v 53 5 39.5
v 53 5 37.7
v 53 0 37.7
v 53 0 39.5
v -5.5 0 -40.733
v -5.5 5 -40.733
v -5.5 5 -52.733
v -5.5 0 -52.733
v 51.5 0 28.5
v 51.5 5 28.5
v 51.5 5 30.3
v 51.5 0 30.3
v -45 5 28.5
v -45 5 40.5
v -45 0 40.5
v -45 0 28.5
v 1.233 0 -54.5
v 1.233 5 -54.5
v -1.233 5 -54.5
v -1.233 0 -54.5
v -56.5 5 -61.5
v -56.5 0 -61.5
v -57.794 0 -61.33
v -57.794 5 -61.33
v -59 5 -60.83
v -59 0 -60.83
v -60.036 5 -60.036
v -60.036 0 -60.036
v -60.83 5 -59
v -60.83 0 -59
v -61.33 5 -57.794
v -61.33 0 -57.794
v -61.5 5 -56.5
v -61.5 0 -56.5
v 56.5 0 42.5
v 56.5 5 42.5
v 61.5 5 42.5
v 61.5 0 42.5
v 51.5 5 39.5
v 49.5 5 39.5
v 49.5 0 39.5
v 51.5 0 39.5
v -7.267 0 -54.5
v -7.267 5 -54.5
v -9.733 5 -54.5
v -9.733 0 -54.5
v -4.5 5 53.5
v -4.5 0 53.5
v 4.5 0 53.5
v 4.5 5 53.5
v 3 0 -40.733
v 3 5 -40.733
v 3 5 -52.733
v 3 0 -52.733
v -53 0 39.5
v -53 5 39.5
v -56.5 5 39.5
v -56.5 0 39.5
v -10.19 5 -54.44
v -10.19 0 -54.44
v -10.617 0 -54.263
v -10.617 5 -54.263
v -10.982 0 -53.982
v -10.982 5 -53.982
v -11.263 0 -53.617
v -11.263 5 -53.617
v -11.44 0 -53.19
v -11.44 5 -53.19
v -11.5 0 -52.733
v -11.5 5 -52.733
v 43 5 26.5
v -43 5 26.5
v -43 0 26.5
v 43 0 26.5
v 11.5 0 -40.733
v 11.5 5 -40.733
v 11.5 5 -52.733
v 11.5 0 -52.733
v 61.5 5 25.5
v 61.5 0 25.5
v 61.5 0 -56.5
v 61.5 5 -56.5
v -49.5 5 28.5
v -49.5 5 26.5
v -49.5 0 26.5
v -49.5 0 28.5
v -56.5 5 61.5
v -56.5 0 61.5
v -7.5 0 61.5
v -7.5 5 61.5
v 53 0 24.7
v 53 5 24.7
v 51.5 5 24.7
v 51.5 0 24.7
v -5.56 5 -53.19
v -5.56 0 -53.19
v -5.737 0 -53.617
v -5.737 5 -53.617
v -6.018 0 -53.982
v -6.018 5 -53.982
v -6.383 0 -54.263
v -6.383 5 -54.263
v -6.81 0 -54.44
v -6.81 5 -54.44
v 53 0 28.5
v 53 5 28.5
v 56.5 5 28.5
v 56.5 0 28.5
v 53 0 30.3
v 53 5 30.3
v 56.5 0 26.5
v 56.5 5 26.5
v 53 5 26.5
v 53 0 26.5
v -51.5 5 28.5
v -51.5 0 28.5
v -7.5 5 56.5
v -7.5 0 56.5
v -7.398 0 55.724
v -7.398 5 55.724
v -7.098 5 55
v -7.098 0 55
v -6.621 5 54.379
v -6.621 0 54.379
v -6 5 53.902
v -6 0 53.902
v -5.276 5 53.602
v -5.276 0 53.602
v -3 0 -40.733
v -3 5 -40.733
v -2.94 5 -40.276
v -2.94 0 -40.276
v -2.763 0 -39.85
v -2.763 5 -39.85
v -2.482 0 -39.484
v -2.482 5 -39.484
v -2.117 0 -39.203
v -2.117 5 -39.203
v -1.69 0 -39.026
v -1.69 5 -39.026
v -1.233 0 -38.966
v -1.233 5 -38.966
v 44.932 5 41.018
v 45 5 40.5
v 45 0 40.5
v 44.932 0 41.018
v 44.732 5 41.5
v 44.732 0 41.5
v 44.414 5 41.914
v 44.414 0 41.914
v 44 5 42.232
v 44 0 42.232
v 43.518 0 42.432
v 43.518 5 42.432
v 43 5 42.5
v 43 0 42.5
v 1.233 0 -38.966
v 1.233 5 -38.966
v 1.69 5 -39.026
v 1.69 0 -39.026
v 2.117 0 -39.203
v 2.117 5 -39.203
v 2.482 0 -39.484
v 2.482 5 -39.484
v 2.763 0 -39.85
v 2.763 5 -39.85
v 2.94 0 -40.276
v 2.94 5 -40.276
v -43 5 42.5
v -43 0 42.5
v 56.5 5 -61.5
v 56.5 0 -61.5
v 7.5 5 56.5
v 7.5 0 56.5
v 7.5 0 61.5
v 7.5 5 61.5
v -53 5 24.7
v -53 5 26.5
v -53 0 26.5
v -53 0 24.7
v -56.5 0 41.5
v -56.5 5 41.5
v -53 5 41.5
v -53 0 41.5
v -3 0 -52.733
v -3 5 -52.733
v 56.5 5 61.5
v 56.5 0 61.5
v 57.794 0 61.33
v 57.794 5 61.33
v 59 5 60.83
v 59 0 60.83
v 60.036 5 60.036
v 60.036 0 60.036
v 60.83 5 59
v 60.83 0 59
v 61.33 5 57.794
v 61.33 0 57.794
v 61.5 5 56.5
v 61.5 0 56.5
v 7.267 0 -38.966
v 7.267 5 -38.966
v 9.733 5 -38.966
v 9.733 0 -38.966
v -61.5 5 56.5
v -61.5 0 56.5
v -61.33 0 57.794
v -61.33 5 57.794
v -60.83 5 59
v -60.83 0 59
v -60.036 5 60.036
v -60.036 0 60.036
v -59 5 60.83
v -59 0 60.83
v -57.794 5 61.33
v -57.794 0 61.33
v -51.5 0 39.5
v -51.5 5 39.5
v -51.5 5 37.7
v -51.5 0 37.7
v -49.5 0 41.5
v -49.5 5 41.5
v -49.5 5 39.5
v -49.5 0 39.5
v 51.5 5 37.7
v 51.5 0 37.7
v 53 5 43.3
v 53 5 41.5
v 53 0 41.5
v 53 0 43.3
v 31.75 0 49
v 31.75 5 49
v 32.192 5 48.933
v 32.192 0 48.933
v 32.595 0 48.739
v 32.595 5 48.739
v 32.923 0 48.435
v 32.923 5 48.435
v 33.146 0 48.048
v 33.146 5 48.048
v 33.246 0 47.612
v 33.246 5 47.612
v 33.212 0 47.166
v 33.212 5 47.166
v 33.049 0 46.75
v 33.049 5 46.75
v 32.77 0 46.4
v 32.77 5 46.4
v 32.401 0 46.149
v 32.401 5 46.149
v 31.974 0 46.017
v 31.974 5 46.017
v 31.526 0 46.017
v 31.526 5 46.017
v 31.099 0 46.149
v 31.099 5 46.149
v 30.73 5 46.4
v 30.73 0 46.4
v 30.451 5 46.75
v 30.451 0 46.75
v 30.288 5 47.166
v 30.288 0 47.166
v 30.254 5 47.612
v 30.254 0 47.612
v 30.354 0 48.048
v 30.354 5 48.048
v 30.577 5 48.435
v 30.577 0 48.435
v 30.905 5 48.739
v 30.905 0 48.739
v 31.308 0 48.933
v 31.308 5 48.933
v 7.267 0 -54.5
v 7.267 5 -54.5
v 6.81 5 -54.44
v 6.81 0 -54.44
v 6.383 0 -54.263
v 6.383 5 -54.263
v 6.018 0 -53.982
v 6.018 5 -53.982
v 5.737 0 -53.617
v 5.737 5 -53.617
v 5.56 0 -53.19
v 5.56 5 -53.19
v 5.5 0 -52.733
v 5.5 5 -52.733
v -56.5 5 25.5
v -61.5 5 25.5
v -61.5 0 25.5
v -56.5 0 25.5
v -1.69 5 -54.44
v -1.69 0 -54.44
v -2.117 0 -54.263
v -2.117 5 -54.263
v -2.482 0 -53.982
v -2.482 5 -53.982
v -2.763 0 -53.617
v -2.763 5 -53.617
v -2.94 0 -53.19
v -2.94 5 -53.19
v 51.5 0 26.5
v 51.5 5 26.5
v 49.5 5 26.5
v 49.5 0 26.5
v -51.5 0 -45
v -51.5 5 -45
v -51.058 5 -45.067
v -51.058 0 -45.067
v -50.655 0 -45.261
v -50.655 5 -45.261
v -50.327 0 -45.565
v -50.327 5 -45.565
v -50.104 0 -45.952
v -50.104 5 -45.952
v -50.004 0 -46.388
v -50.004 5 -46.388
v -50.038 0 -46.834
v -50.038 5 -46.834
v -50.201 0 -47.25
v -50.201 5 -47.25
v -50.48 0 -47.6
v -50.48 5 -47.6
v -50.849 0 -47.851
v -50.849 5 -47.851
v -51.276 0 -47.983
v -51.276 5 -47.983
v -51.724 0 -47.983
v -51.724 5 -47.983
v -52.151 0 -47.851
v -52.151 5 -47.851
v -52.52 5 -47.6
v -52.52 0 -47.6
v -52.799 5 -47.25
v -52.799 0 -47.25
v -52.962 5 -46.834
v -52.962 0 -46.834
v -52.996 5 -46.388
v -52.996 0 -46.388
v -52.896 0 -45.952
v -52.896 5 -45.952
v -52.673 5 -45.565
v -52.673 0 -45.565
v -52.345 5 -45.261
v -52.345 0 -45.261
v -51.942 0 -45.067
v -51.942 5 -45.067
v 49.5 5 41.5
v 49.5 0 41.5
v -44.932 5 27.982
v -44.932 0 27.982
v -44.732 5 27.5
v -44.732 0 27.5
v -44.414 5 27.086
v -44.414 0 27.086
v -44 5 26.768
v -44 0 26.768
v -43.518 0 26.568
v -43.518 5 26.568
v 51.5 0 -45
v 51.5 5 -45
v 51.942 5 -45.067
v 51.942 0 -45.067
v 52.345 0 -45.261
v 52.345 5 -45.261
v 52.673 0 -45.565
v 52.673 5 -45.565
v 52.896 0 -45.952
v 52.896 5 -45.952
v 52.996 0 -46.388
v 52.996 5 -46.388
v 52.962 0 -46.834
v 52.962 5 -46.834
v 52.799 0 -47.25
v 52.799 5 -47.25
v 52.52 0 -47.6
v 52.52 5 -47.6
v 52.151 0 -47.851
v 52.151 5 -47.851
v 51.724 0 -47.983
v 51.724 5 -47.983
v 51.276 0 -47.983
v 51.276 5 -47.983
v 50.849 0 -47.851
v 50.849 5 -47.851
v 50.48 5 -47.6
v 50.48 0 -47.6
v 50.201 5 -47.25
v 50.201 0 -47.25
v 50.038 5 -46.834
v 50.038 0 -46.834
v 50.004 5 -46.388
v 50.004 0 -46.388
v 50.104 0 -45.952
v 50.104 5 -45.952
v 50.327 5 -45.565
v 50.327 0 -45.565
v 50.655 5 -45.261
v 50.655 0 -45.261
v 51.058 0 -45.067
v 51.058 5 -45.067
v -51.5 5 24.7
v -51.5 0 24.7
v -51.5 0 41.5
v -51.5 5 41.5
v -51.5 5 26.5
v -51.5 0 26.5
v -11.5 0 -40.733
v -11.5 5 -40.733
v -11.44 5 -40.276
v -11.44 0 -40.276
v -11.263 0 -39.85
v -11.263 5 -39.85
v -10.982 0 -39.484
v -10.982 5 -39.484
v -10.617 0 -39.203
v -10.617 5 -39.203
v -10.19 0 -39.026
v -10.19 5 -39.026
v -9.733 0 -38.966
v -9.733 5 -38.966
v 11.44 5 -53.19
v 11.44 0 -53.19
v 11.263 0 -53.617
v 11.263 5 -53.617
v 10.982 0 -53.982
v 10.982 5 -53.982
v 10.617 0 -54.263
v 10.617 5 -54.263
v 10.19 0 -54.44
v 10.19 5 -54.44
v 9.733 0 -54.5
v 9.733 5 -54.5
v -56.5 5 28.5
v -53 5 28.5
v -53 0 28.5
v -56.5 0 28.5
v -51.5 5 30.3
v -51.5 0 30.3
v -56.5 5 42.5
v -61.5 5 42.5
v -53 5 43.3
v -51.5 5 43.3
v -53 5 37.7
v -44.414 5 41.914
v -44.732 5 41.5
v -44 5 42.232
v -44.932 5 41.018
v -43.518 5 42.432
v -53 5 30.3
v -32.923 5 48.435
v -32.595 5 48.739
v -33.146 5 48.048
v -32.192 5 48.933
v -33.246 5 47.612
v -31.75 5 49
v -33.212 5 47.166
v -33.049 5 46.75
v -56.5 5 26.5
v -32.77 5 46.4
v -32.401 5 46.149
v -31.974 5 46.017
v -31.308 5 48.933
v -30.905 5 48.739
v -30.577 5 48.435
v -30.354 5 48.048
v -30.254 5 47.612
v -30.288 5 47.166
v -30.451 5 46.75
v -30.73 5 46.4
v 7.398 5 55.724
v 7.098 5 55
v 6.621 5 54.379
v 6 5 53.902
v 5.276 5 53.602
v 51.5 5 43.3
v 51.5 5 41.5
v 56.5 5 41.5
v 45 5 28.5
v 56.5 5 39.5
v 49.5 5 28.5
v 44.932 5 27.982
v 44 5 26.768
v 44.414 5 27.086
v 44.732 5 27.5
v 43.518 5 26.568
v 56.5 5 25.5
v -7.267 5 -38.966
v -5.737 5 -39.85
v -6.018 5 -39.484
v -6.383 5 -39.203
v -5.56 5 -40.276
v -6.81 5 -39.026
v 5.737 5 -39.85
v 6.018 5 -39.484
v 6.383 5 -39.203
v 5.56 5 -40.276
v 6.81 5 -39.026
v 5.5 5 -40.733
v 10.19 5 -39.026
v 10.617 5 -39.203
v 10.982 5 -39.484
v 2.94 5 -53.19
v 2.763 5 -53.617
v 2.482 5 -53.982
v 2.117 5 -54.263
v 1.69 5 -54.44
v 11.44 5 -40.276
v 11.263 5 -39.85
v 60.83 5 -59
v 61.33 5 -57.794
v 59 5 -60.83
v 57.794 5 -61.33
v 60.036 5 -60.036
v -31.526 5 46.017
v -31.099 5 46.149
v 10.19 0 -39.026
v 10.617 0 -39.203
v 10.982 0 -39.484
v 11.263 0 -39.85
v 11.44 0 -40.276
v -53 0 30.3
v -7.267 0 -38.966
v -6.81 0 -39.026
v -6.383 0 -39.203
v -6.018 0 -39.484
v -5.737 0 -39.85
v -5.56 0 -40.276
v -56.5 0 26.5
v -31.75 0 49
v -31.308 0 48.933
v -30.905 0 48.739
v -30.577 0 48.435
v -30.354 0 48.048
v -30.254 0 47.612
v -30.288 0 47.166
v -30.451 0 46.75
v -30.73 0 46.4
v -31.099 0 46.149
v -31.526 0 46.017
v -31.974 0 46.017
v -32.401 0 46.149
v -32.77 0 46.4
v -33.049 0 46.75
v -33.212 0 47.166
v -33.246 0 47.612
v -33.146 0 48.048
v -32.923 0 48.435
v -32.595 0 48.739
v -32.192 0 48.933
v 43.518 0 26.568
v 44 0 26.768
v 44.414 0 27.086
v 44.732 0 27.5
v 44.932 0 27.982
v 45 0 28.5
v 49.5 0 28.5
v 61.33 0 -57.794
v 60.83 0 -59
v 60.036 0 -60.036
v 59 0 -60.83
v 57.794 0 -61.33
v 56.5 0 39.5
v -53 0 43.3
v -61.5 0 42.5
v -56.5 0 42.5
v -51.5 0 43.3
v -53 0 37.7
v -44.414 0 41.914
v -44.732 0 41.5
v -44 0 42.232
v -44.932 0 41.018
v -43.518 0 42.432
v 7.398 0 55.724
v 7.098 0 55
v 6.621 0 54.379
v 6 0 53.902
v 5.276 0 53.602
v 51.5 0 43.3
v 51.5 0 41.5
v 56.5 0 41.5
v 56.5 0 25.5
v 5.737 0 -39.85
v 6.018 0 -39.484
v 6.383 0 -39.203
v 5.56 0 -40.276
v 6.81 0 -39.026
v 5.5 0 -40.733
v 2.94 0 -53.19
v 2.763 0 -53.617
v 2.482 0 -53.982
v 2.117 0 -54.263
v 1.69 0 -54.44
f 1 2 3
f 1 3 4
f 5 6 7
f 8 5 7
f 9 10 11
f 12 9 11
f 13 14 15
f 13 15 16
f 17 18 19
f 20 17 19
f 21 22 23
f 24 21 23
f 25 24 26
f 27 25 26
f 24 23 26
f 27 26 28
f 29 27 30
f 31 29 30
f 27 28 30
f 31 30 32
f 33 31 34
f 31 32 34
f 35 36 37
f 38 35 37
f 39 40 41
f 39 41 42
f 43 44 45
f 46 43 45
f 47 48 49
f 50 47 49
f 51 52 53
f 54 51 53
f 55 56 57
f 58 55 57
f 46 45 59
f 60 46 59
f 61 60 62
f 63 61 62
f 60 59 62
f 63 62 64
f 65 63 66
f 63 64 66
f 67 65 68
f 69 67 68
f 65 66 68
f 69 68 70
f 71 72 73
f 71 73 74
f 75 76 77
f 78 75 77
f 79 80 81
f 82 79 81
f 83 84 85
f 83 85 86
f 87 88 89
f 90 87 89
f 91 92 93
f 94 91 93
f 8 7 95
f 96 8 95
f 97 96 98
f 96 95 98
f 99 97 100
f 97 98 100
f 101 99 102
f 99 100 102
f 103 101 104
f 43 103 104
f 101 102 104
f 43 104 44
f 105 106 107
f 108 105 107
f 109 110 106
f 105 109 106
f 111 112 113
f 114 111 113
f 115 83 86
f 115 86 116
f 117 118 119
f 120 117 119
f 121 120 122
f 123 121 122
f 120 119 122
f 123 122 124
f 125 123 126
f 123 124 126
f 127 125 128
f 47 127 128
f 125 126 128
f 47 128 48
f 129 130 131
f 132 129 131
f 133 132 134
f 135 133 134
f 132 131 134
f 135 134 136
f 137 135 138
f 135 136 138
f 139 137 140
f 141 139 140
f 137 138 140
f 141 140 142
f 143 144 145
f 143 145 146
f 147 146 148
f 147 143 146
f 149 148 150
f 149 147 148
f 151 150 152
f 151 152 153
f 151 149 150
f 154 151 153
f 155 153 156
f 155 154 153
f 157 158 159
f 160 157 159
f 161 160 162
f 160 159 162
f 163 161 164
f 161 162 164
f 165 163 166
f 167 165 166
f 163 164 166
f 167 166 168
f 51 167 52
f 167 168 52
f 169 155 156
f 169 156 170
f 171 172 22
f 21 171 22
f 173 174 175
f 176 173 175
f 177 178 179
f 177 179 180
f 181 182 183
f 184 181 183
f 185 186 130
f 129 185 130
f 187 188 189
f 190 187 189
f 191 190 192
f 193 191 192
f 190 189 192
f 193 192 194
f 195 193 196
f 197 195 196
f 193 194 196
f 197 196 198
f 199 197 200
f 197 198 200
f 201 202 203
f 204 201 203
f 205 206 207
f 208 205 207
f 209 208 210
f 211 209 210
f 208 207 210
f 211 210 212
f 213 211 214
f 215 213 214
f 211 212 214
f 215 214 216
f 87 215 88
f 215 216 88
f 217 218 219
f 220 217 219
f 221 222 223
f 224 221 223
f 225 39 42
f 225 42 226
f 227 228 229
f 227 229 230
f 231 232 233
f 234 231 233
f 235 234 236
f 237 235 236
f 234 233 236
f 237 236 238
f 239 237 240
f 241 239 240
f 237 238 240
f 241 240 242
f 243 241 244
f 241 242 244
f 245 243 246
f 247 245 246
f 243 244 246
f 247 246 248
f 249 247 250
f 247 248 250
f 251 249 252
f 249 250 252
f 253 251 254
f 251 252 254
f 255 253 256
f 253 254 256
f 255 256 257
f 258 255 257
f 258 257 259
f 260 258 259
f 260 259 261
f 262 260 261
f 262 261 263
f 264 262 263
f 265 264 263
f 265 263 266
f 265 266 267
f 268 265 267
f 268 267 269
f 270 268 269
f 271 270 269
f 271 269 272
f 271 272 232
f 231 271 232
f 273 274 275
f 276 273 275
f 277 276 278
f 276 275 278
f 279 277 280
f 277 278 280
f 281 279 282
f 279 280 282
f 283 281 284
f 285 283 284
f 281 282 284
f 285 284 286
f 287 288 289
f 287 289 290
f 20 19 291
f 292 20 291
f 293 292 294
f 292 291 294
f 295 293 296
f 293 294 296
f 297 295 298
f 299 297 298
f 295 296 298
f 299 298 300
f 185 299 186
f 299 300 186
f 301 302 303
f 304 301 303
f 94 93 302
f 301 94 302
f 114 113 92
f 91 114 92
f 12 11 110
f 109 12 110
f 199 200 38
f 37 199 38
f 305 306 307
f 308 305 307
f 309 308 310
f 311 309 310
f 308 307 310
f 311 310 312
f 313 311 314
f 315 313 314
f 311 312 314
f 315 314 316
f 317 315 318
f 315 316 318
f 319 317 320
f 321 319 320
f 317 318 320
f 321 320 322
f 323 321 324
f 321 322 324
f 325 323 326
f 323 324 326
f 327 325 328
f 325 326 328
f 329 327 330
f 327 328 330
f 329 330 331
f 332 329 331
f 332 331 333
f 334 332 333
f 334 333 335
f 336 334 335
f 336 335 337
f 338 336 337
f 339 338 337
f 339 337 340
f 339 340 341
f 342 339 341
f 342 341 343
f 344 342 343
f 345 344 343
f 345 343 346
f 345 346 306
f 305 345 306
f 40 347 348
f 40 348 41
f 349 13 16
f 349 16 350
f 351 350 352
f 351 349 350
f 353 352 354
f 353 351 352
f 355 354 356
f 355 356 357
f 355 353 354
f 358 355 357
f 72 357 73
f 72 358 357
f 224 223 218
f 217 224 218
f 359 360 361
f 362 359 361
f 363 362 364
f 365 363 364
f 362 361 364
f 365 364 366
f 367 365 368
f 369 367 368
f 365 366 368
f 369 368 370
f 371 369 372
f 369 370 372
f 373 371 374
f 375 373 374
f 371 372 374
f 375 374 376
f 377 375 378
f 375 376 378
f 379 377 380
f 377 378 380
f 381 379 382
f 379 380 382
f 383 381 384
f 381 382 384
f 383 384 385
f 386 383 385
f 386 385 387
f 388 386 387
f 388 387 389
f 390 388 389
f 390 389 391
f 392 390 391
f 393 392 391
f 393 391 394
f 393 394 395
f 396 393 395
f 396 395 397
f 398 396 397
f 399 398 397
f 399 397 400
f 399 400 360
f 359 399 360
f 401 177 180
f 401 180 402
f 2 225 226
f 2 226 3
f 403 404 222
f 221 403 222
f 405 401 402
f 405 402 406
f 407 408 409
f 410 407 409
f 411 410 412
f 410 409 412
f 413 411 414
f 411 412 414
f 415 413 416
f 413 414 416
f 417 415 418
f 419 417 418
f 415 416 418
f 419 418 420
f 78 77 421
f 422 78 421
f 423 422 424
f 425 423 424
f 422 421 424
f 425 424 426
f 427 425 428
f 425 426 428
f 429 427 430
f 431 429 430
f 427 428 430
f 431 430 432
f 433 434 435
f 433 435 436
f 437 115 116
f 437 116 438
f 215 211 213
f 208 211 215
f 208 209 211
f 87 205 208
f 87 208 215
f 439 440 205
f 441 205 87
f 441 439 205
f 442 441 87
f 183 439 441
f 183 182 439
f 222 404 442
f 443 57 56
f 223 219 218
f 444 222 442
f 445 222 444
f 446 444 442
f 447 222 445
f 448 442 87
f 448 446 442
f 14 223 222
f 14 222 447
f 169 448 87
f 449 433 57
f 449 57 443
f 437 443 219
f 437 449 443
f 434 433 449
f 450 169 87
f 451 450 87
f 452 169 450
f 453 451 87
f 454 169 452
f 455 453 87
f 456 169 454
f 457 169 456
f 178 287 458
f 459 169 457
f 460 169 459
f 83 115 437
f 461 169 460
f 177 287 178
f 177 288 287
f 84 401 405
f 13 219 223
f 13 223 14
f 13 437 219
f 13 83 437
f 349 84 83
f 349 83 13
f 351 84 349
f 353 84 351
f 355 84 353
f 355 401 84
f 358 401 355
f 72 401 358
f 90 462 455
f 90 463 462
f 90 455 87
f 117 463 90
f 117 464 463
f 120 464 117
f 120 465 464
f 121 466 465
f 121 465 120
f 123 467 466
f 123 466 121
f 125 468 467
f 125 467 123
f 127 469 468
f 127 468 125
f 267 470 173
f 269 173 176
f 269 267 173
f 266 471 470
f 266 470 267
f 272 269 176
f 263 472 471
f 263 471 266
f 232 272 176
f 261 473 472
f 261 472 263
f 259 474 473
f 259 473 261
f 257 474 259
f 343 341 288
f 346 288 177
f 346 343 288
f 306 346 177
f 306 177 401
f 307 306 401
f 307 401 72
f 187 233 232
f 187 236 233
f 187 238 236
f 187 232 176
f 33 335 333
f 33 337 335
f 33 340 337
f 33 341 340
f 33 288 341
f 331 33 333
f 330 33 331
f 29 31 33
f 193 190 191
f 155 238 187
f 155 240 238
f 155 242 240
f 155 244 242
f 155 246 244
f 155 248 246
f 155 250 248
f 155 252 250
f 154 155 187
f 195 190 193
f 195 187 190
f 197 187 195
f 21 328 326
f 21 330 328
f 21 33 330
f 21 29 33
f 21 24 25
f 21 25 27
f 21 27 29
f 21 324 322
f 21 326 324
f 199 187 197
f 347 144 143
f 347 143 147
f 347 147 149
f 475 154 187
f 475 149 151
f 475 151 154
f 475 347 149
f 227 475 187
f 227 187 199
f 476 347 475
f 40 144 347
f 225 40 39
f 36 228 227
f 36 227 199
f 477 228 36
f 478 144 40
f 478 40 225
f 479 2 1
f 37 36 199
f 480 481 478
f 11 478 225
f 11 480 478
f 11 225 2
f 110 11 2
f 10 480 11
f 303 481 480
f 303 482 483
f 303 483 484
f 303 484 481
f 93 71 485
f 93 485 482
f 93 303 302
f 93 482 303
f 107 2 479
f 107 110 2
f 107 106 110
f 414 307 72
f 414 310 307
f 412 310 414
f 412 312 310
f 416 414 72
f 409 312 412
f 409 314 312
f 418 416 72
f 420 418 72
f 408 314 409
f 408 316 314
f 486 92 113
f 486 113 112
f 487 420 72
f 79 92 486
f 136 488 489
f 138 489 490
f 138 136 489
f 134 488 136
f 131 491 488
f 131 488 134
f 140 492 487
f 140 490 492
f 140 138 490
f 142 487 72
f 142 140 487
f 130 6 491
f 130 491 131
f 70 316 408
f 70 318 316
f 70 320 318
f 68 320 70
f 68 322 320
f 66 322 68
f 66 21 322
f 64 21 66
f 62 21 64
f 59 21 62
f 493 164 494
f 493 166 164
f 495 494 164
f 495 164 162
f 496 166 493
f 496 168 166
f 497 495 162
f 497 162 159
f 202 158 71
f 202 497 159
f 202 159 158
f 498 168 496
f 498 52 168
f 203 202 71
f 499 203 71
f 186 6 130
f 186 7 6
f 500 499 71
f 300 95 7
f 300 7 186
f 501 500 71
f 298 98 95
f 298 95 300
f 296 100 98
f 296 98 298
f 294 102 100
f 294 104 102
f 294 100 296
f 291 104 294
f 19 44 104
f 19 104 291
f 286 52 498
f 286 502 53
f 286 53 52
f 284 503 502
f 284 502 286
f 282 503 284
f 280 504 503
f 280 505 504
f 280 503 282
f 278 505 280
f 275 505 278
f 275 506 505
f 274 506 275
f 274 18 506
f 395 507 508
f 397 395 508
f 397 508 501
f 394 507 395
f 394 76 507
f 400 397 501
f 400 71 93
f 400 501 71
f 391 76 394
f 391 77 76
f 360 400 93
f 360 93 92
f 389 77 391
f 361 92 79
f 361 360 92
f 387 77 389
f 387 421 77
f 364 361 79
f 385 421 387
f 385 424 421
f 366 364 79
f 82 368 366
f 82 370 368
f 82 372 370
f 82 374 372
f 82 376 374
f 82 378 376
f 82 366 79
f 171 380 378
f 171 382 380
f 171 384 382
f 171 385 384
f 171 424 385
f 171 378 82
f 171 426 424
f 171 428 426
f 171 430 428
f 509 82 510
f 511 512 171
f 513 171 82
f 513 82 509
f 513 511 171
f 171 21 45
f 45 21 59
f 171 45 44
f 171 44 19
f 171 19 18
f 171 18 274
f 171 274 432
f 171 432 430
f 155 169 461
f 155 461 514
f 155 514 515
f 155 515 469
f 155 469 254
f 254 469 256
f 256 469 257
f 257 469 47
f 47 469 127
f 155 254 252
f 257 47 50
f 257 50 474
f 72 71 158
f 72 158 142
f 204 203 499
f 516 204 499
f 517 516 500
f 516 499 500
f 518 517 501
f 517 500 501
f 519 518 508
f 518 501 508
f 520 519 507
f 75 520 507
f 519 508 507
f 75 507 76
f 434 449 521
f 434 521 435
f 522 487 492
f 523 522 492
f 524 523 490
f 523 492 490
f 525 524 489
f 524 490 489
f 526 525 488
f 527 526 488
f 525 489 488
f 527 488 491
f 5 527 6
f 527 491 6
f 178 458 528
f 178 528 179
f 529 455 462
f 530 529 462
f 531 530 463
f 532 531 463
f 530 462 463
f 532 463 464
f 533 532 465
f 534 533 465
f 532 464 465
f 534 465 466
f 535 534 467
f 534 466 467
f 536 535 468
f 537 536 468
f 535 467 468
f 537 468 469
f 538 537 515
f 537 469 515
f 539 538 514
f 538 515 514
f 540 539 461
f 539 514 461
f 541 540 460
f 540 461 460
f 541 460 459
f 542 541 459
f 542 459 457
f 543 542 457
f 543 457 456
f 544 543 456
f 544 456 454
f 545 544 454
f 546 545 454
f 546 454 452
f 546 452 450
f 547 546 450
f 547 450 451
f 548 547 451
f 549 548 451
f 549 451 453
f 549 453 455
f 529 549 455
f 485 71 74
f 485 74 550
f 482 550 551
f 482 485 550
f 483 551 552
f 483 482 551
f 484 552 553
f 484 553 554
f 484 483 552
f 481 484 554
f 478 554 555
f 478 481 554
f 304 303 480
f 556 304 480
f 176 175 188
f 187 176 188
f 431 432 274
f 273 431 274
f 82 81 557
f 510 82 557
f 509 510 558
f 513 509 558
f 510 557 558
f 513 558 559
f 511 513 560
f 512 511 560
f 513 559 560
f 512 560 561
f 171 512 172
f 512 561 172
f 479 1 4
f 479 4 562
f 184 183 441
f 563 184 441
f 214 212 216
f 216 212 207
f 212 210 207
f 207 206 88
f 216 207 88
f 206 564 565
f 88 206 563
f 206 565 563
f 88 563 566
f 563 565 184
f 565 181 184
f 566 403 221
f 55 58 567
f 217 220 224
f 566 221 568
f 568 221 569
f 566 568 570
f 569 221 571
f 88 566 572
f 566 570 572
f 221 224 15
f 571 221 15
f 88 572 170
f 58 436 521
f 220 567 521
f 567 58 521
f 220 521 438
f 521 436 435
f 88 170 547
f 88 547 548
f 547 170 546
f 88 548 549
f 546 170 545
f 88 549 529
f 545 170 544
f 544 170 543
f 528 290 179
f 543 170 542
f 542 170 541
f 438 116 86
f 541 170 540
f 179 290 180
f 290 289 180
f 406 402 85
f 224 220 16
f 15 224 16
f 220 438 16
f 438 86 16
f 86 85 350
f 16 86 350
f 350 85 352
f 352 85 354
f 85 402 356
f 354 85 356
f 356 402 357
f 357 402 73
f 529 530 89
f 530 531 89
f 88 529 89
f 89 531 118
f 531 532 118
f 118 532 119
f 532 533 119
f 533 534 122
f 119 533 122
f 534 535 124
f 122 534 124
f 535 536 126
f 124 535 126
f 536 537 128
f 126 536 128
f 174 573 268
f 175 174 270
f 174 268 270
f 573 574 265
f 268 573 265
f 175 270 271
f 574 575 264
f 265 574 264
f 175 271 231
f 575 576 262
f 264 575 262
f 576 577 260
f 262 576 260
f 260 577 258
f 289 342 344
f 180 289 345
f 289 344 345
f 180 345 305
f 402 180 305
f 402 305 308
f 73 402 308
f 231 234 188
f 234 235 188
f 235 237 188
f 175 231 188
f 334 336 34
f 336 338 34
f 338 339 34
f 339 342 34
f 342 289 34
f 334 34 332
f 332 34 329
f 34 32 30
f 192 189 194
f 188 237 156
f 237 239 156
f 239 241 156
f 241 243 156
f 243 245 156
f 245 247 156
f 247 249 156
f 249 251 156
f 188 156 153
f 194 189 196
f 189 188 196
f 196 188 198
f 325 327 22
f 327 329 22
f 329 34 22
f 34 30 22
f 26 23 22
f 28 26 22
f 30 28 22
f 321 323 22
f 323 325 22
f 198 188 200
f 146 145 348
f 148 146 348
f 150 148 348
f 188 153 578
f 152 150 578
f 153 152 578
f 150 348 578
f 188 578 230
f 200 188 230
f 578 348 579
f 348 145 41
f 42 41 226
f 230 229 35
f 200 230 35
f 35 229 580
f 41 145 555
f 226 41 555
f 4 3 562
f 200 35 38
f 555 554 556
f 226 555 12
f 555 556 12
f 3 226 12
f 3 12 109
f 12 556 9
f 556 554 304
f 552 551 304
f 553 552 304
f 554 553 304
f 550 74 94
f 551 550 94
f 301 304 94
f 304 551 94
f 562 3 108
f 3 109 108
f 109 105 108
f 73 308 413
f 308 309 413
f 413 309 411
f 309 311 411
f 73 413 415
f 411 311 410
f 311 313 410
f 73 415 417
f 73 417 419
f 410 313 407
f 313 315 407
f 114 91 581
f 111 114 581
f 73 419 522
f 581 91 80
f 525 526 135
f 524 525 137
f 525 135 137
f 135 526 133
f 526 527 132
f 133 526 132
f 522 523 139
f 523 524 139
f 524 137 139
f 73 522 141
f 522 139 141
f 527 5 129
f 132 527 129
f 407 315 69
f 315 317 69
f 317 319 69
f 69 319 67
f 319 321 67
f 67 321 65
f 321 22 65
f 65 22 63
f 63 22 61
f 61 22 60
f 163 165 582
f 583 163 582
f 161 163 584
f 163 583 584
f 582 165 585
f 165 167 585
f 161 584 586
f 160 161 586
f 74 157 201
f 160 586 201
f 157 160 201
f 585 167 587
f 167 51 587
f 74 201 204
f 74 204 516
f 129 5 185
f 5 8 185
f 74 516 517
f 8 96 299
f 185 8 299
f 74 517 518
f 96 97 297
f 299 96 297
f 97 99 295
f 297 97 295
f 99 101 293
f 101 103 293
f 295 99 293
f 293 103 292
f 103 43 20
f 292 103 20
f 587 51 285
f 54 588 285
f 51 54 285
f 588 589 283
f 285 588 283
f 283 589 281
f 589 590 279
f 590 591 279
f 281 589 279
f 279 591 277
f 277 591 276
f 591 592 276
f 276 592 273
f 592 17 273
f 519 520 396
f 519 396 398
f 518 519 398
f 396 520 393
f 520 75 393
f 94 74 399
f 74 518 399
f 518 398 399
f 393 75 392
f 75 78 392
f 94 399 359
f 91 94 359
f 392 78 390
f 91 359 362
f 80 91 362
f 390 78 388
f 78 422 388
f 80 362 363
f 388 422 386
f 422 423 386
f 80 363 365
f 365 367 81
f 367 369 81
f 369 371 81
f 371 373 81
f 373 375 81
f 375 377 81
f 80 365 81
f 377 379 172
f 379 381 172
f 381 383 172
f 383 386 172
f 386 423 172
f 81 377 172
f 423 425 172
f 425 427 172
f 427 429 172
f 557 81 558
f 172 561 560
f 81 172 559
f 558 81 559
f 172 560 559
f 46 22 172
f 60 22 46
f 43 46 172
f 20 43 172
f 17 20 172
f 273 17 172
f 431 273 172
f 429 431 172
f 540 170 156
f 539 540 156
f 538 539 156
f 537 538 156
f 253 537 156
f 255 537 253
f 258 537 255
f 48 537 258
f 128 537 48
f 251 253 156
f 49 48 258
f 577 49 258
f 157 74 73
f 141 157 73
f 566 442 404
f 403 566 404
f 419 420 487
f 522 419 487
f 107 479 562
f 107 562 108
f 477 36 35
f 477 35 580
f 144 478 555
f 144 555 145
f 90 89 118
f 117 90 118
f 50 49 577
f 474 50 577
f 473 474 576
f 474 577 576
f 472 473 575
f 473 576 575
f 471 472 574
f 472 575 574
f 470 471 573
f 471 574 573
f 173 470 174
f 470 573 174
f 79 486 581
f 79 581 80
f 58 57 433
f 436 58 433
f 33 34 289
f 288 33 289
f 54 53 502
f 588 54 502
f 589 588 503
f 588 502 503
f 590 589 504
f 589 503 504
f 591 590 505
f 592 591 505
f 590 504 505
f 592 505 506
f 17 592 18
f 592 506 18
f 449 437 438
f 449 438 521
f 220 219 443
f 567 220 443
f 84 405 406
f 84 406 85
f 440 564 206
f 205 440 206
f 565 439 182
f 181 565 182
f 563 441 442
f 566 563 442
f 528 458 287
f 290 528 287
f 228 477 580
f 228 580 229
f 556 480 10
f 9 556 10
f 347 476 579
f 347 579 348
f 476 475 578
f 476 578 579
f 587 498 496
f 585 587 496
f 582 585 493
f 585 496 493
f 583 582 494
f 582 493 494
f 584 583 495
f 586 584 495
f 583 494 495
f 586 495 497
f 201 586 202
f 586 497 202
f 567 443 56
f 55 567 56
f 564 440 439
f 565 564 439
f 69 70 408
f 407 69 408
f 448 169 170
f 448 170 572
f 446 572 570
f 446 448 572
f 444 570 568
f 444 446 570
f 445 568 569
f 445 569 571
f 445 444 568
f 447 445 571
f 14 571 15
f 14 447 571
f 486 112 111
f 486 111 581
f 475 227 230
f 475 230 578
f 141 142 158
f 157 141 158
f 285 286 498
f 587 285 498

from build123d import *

# Parameters (mm, degrees)
RESSALTO_EXTRUS_O1_DEPTH = 5
CORTE_EXTRUS_O1_DEPTH    = 5
ESBO_O3_W                = 5
ESBO_O3_H                = 17
CORTE_EXTRUS_O3_DEPTH    = 5
CORTE_EXTRUS_O4_DEPTH    = 10
CORTE_EXTRUS_O5_DEPTH    = 5
ESBO_O6_R                = 1.5
CORTE_EXTRUS_O6_DEPTH    = 20
CORTE_EXTRUS_O7_DEPTH    = 10


with BuildPart() as part:
    # Esboço1 → Ressalto-extrusão1 (new body)
    with BuildSketch(Plane(origin=(0, 0, 0), x_dir=(1, 0, 0), z_dir=(0, 1, 0))):
        with BuildLine():
            Line((-56.5, -61.5), (56.5, -61.5))
            ThreePointArc((56.5, -61.5), (60.035533906, -60.035533906), (61.5, -56.5))
            Line((61.5, -56.5), (61.5, 56.5))
            ThreePointArc((61.5, 56.5), (60.035533906, 60.035533906), (56.5, 61.5))
            Line((56.5, 61.5), (-56.5, 61.5))
            ThreePointArc((-56.5, 61.5), (-60.035533906, 60.035533906), (-61.5, 56.5))
            Line((-61.5, 56.5), (-61.5, -56.5))
            ThreePointArc((-61.5, -56.5), (-60.035533906, -60.035533906), (-56.5, -61.5))
        make_face()
    extrude(amount=RESSALTO_EXTRUS_O1_DEPTH)

    # Esboço2 → Corte-extrusão1 (cut)
    with BuildSketch(Plane(origin=(0, 5, 0), x_dir=(1, 0, 0), z_dir=(0, 1, 0))):
        with BuildLine():
            Line((1.233117681, 54.5), (-1.233117681, 54.5))
            ThreePointArc((-1.233117681, 54.5), (-2.48249215, 53.98249215), (-3, 52.733117681))
            Line((-3, 52.733117681), (-3, 40.733117681))
            ThreePointArc((-3, 40.733117681), (-2.48249215, 39.483743212), (-1.233117681, 38.966235362))
            Line((-1.233117681, 38.966235362), (1.233117681, 38.966235362))
            ThreePointArc((1.233117681, 38.966235362), (2.48249215, 39.483743212), (3, 40.733117681))
            Line((3, 40.733117681), (3, 52.733117681))
            ThreePointArc((3, 52.733117681), (2.48249215, 53.98249215), (1.233117681, 54.5))
        make_face()
        with BuildLine():
            Line((-7.266882319, 54.5), (-9.733117681, 54.5))
            ThreePointArc((-9.733117681, 54.5), (-10.98249215, 53.98249215), (-11.5, 52.733117681))
            Line((-11.5, 52.733117681), (-11.5, 40.733117681))
            ThreePointArc((-11.5, 40.733117681), (-10.98249215, 39.483743212), (-9.733117681, 38.966235362))
            Line((-9.733117681, 38.966235362), (-7.266882319, 38.966235362))
            ThreePointArc((-7.266882319, 38.966235362), (-6.01750785, 39.483743212), (-5.5, 40.733117681))
            Line((-5.5, 40.733117681), (-5.5, 52.733117681))
            ThreePointArc((-5.5, 52.733117681), (-6.01750785, 53.98249215), (-7.266882319, 54.5))
        make_face()
        with BuildLine():
            Line((7.266882319, 38.966235362), (9.733117681, 38.966235362))
            ThreePointArc((9.733117681, 38.966235362), (10.98249215, 39.483743212), (11.5, 40.733117681))
            Line((11.5, 40.733117681), (11.5, 52.733117681))
            ThreePointArc((11.5, 52.733117681), (10.98249215, 53.98249215), (9.733117681, 54.5))
            Line((9.733117681, 54.5), (7.266882319, 54.5))
            ThreePointArc((7.266882319, 54.5), (6.01750785, 53.98249215), (5.5, 52.733117681))
            Line((5.5, 52.733117681), (5.5, 40.733117681))
            ThreePointArc((5.5, 40.733117681), (6.01750785, 39.483743212), (7.266882319, 38.966235362))
        make_face()
    extrude(amount=-CORTE_EXTRUS_O1_DEPTH, mode=Mode.SUBTRACT)

    # Esboço3 → Corte-extrusão3 (cut)
    with BuildSketch(Plane(origin=(0, 5, 0), x_dir=(1, 0, 0), z_dir=(0, 1, 0))):
        with Locations((-59, -34)):
            Rectangle(ESBO_O3_W, ESBO_O3_H)
        with Locations((59, -34)):
            Rectangle(ESBO_O3_W, ESBO_O3_H)
    extrude(amount=-CORTE_EXTRUS_O3_DEPTH, mode=Mode.SUBTRACT)

    # Esboço4 → Corte-extrusão4 (cut)
    with BuildSketch(Plane(origin=(0, 5, 0), x_dir=(1, 0, 0), z_dir=(0, 1, 0))):
        Polygon((56.5, -41.5), (53, -41.5), (53, -43.3), (51.5, -43.3), (51.5, -41.5), (49.5, -41.5), (49.5, -39.5), (51.5, -39.5), (51.5, -37.7), (53, -37.7), (53, -39.5), (56.5, -39.5), align=None)
        Polygon((56.5, -26.5), (53, -26.5), (53, -24.7), (51.5, -24.7), (51.5, -26.5), (49.5, -26.5), (49.5, -28.5), (51.5, -28.5), (51.5, -30.3), (53, -30.3), (53, -28.5), (56.5, -28.5), align=None)
    corte_extrus_o4 = extrude(amount=-CORTE_EXTRUS_O4_DEPTH, mode=Mode.SUBTRACT)

    # Espelhar1: Corte-extrusão4 across plane
    add(corte_extrus_o4.mirror(Plane(origin=(0, 0, 0), x_dir=(0, 0, 1), z_dir=(1, 0, 0))), mode=Mode.SUBTRACT)

    # Esboço5 → Corte-extrusão5 (cut)
    with BuildSketch(Plane(origin=(0, 5, 0), x_dir=(1, 0, 0), z_dir=(0, 1, 0))):
        with BuildLine():
            Line((43, -42.5), (-43, -42.5))
            ThreePointArc((-43, -42.5), (-44.414213562, -41.914213562), (-45, -40.5))
            Line((-45, -40.5), (-45, -28.5))
            ThreePointArc((-45, -28.5), (-44.414213562, -27.085786438), (-43, -26.5))
            Line((-43, -26.5), (43, -26.5))
            ThreePointArc((43, -26.5), (44.414213562, -27.085786438), (45, -28.5))
            Line((45, -28.5), (45, -40.5))
            ThreePointArc((45, -40.5), (44.414213562, -41.914213562), (43, -42.5))
        make_face()
    extrude(amount=-CORTE_EXTRUS_O5_DEPTH, mode=Mode.SUBTRACT)

    # Esboço6 → Corte-extrusão6 (cut)
    with BuildSketch(Plane(origin=(0, 5, 0), x_dir=(1, 0, 0), z_dir=(0, 1, 0))):
        with Locations(Location((-51.5, 46.5, 0), (0, 0, 270))):
            Circle(ESBO_O6_R)
        with Locations(Location((51.5, 46.5, 0), (0, 0, 270))):
            Circle(ESBO_O6_R)
        with Locations(Location((31.75, -47.5, 0), (0, 0, 270))):
            Circle(ESBO_O6_R)
        with Locations(Location((-31.75, -47.5, 0), (0, 0, 270))):
            Circle(ESBO_O6_R)
    extrude(amount=-CORTE_EXTRUS_O6_DEPTH, mode=Mode.SUBTRACT)

    # Esboço7 → Corte-extrusão7 (cut)
    with BuildSketch(Plane.XZ):
        with BuildLine():
            Line((7.5, 61.5), (-7.5, 61.5))
            Line((-7.5, 61.5), (-7.5, 56.5))
            ThreePointArc((-7.5, 56.5), (-6.621320344, 54.378679656), (-4.5, 53.5))
            Line((-4.5, 53.5), (4.5, 53.5))
            ThreePointArc((4.5, 53.5), (6.621320344, 54.378679656), (7.5, 56.5))
            Line((7.5, 56.5), (7.5, 61.5))
        make_face()
    extrude(amount=-CORTE_EXTRUS_O7_DEPTH, mode=Mode.SUBTRACT)


solid = part.part
